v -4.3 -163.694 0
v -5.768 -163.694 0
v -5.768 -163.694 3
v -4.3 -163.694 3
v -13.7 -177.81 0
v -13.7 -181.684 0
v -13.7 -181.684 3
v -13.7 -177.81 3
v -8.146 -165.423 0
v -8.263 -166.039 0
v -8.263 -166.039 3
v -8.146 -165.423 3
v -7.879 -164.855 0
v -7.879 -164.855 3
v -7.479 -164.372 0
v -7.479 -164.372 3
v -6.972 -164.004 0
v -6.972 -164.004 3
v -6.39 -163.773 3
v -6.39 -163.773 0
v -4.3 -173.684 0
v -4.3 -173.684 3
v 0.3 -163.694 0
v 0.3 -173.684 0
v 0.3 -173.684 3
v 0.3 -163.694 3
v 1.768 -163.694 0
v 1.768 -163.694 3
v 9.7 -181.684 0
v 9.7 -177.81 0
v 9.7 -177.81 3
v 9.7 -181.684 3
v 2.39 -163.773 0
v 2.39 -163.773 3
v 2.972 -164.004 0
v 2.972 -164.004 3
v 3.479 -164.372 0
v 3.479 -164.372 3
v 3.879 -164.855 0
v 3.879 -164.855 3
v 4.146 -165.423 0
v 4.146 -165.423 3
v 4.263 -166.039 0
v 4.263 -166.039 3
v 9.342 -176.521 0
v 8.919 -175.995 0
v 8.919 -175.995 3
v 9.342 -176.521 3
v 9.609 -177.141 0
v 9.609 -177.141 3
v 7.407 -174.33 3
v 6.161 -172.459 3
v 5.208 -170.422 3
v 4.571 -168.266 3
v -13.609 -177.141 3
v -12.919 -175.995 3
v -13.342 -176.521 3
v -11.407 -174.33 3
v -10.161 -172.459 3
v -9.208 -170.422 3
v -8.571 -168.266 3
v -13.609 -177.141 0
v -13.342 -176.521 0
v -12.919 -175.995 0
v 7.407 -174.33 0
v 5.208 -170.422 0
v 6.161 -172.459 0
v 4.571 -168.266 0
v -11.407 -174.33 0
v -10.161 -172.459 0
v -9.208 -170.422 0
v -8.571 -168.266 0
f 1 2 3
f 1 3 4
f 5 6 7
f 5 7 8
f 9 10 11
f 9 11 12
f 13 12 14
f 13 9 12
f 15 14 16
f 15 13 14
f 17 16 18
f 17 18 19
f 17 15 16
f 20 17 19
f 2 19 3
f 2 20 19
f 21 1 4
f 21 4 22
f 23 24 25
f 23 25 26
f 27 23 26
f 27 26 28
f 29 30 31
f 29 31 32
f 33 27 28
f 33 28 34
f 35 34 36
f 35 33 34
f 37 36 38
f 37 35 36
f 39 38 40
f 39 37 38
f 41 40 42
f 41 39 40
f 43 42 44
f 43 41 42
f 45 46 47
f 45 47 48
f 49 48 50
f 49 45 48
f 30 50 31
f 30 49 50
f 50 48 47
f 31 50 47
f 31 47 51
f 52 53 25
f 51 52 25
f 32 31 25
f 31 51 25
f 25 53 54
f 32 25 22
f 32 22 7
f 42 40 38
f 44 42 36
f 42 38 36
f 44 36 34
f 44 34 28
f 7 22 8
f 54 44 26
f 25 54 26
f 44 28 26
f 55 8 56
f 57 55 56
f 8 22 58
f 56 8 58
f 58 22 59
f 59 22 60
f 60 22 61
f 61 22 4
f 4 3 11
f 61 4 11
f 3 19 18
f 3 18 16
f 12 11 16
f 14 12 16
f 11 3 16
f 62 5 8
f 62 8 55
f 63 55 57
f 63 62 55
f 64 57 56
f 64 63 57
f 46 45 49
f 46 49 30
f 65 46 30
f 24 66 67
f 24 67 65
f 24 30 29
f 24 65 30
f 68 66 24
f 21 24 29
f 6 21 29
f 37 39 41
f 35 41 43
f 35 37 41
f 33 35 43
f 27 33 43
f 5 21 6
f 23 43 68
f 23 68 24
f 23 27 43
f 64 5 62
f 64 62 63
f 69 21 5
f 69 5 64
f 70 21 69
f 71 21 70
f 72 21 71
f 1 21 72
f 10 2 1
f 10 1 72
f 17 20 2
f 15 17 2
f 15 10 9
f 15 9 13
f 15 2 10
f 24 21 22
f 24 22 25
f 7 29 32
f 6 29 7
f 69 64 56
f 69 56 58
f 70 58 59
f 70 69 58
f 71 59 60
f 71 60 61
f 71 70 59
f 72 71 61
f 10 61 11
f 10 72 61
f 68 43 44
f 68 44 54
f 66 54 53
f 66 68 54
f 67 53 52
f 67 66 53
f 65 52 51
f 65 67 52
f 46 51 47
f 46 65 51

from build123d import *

# Parameters (mm, degrees)
BOSS_EXTRUDE1_DEPTH = 3


with BuildPart() as part:
    # Sketch1 → Boss-Extrude1 (new body)
    with BuildSketch(Plane.XY):
        with BuildLine():
            Line((-4.3, -163.694308418), (-4.3, -173.684305639))
            Line((-4.3, -173.684305639), (0.3, -173.684305639))
            Line((0.3, -173.684305639), (0.3, -163.694308418))
            Line((0.3, -163.694308418), (1.767652512, -163.694308418))
            ThreePointArc((1.767652512, -163.694308418), (3.479450891, -164.372291319), (4.262793246, -166.038511371))
            ThreePointArc((4.262793246, -166.038511371), (5.64620009, -171.458376258), (8.919091092, -175.994556853))
            ThreePointArc((8.919091092, -175.994556853), (9.496489466, -176.821698794), (9.7, -177.809694813))
            Line((9.7, -177.809694813), (9.7, -181.684305639))
            Line((9.7, -181.684305639), (-0.3, -181.684305639))
            Line((-0.3, -181.684305639), (-3.7, -181.684305639))
            Line((-3.7, -181.684305639), (-13.7, -181.684305639))
            Line((-13.7, -181.684305639), (-13.7, -177.809694813))
            ThreePointArc((-13.7, -177.809694813), (-13.496489466, -176.821698794), (-12.919091092, -175.994556853))
            ThreePointArc((-12.919091092, -175.994556853), (-9.64620009, -171.458376258), (-8.262793246, -166.038511371))
            ThreePointArc((-8.262793246, -166.038511371), (-7.479450891, -164.372291319), (-5.767652512, -163.694308418))
            Line((-5.767652512, -163.694308418), (-4.3, -163.694308418))
        make_face()
    extrude(amount=BOSS_EXTRUDE1_DEPTH)


solid = part.part
